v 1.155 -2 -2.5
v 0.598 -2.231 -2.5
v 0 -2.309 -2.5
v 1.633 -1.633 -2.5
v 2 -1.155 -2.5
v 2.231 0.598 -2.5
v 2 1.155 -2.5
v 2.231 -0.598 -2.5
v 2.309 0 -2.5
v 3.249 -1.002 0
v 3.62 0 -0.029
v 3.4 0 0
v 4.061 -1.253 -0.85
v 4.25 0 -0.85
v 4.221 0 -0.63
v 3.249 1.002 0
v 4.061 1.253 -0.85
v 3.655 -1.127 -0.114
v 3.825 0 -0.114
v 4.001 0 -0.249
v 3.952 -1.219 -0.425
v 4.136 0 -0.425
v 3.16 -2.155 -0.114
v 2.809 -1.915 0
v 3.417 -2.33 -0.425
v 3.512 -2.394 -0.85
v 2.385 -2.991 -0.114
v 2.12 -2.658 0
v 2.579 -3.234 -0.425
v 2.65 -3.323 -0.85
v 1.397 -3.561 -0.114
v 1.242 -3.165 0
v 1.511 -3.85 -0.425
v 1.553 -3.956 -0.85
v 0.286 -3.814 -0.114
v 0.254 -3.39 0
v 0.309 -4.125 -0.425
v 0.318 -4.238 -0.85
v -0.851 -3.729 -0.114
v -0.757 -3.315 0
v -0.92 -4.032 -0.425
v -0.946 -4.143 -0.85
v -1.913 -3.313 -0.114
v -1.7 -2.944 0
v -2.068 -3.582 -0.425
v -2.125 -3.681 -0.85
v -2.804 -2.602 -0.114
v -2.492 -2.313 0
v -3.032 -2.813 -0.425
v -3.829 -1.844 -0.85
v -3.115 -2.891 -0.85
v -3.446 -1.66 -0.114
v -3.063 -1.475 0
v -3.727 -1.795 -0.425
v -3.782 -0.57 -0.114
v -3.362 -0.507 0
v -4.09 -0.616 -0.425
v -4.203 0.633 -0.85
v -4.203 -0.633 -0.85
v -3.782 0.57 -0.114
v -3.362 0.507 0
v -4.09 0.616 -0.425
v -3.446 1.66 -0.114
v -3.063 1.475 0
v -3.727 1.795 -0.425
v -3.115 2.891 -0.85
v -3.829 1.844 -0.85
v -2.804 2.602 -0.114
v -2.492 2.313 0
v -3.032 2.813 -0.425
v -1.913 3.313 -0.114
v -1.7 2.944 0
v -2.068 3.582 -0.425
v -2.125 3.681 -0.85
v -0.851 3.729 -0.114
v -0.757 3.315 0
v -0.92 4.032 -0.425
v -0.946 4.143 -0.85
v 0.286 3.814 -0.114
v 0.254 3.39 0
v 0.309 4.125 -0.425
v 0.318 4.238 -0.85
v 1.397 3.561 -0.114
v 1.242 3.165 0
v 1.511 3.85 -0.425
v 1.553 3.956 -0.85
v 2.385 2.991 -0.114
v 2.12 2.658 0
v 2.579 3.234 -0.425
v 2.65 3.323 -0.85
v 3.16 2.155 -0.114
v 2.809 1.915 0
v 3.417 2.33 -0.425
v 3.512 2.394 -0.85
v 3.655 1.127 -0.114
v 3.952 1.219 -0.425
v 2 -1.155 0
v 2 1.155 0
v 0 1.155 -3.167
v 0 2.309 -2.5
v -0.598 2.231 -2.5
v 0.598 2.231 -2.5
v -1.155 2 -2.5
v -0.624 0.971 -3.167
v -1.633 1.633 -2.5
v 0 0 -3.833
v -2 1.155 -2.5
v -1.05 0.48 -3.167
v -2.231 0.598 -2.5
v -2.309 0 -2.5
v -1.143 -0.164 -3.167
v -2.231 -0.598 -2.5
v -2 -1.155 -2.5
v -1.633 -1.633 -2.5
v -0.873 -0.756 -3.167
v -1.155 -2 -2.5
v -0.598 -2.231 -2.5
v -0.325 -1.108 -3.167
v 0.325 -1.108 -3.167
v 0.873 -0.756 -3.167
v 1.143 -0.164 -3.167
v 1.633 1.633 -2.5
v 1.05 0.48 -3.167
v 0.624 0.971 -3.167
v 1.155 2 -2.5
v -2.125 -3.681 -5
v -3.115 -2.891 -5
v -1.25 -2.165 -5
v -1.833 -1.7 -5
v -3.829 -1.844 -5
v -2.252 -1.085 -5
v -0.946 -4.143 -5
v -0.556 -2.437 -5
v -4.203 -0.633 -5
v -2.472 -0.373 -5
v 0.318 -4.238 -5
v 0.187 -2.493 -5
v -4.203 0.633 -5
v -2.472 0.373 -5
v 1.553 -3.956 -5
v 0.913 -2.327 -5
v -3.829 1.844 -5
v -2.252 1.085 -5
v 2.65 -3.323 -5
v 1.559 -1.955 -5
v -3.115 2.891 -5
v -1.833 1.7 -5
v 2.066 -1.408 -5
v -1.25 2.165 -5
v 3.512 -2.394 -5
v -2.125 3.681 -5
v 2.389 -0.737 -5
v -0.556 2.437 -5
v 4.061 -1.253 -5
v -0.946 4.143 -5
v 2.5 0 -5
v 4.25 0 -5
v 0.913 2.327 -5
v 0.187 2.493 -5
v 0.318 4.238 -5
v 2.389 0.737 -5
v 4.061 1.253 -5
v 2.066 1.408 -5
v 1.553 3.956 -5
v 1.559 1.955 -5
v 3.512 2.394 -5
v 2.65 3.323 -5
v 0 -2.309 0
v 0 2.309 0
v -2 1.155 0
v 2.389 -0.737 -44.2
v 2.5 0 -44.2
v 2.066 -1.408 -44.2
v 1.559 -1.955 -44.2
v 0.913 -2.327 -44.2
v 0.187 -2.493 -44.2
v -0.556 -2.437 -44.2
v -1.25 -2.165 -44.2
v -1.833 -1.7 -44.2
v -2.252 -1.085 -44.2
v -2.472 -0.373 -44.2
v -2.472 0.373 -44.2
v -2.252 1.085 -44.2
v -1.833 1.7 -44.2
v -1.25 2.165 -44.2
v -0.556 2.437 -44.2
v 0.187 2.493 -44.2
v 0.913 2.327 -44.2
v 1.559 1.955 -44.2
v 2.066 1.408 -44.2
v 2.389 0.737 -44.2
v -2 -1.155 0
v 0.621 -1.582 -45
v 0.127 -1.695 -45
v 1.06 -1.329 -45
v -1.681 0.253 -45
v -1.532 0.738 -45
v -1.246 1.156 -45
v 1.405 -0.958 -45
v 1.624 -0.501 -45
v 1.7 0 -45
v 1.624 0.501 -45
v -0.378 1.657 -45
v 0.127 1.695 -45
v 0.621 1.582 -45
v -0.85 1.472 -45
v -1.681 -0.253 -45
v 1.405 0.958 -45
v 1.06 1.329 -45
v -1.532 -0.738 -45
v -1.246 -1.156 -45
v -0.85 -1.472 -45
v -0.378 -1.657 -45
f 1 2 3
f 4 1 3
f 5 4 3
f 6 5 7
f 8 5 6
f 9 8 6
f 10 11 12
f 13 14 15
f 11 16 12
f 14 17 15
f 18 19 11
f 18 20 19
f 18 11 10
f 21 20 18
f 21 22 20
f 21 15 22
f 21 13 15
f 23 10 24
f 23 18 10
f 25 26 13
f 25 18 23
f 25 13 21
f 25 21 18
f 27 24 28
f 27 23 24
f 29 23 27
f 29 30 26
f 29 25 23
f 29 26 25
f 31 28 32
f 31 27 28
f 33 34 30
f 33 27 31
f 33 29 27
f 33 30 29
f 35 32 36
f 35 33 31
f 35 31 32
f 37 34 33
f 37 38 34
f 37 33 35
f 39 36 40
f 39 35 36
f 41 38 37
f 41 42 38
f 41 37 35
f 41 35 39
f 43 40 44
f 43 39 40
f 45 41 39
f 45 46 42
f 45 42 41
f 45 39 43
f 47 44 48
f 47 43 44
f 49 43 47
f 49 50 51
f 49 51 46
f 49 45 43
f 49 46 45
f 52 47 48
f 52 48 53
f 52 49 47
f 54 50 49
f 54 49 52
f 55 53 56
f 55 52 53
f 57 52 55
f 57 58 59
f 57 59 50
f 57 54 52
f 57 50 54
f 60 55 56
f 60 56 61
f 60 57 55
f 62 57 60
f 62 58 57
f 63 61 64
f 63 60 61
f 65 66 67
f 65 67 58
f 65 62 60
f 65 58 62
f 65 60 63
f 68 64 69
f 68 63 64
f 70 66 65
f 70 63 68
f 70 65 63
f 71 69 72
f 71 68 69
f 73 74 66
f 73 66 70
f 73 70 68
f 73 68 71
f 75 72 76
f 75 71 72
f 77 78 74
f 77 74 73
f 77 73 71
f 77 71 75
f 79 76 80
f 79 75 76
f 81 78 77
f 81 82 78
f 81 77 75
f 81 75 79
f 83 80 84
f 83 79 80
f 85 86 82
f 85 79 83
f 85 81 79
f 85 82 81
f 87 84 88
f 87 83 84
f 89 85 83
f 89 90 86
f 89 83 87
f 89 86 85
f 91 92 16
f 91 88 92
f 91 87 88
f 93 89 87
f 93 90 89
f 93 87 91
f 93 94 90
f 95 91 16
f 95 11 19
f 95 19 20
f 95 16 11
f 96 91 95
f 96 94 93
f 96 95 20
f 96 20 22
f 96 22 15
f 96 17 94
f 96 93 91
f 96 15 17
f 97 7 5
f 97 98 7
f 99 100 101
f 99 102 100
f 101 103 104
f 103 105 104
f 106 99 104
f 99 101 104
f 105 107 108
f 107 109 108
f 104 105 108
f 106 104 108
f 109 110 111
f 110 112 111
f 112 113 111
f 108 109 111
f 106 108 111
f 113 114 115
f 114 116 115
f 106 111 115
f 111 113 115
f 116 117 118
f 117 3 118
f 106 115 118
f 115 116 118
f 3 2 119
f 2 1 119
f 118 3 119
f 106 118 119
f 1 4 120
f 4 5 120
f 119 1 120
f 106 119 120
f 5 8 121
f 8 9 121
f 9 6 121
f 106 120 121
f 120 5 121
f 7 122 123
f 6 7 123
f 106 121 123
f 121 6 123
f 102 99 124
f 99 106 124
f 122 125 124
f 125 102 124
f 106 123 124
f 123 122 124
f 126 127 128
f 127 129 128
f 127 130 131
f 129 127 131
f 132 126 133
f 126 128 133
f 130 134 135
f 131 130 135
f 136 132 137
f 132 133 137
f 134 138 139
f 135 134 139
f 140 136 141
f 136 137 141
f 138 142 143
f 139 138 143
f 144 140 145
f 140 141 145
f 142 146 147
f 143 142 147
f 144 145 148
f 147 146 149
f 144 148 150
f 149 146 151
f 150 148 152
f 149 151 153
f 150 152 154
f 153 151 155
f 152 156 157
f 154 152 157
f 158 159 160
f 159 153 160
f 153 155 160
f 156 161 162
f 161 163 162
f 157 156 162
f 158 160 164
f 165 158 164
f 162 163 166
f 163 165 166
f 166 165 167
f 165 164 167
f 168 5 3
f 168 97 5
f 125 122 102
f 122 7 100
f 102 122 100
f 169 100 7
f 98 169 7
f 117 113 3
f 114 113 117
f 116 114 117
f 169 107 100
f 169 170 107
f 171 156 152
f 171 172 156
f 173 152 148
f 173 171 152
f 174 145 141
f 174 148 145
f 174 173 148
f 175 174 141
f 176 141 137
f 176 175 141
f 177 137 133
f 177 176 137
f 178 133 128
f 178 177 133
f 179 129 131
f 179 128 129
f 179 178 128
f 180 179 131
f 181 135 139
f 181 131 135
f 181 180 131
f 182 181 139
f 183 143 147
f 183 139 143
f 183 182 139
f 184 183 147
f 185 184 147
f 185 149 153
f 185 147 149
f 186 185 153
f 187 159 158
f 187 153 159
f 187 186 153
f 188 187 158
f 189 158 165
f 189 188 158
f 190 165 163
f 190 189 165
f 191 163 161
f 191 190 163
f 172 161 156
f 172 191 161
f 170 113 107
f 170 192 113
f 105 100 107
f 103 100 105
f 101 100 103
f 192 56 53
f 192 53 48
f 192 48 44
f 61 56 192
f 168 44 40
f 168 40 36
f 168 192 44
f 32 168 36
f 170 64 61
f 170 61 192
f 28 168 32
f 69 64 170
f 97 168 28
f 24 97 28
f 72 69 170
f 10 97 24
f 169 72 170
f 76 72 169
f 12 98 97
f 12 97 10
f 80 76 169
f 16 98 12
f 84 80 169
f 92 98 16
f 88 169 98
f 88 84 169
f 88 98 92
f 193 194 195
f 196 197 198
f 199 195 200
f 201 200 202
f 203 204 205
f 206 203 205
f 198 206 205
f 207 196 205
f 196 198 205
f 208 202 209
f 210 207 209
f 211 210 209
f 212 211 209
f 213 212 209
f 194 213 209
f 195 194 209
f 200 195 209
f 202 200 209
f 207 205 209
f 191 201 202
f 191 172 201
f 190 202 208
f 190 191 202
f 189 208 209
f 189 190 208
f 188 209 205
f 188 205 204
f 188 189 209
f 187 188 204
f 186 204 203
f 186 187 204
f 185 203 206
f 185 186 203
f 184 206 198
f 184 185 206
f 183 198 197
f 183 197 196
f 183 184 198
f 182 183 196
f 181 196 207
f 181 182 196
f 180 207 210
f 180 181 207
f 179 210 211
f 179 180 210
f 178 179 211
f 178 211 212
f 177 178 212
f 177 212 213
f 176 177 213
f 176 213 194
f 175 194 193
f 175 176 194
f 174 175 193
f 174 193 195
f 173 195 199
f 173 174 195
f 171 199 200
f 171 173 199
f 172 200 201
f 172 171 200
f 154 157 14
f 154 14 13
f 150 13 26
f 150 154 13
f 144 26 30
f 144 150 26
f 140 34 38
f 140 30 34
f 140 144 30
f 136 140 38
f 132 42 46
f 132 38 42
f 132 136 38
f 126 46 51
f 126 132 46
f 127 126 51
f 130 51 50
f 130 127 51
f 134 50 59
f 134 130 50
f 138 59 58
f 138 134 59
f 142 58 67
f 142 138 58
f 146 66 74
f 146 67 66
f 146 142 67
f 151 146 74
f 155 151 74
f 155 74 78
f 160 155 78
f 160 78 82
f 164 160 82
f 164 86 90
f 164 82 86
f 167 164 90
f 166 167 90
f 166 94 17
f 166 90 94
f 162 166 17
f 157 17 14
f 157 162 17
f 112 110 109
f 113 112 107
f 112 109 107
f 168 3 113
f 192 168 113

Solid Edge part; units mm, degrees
sketch "Sketch1" plane through (0, 0, 0) normal (0, -1, 0) x (1, 0, 0)
  line L0 (0, 0) -> (3.4, 0)
  arc A0 (3.4, 0) -> (4.25, -0.85) centre (3.4, -0.85) cw
  line L1 (4.25, -0.85) -> (4.25, -5)
  line L2 (4.25, -5) -> (2.5, -5)
  line L3 (2.5, -5) -> (2.5, -44.2)
  line L4 (2.5, -44.2) -> (1.7, -45)
  line L5 (1.7, -45) -> (0, -45)
revolve "RevolvedProtrusion1" add sketch "Sketch1" angle 360 about axis through (0, 0, -45) along (0, 0, 1)
sketch "Sketch2" plane through (0, 0, 0) normal (0, 0, 1) x (1, 0, 0)
  line L0 (-2, -1.1547) -> (-2, 1.1547)
  line L1 (-2, 1.1547) -> (0, 2.3094)
  line L2 (0, 2.3094) -> (2, 1.1547)
  line L3 (2, 1.1547) -> (2, -1.1547)
  line L4 (2, -1.1547) -> (0, -2.3094)
  line L5 (0, -2.3094) -> (-2, -1.1547)
extrude "Cutout1" cut sketch "Sketch2" against normal blind 2.5
sketch "Sketch3" plane through (0, 0, 0) normal (1, 0, 0) x (0, 1, 0)
  line L0 (0, -3.8333) -> (2.3094, -2.5)
  line L1 (0, -2.5) -> (2.3094, -2.5)
  line L2 (0, -2.5) -> (0, -3.8333)
revolve "RevolvedCutout1" cut sketch "Sketch3" angle 360 about axis through (0, 0, -60.325) along (0, 0, 1)
cosmetic_thread "Thread1" size "M5"
properties part number "18"
